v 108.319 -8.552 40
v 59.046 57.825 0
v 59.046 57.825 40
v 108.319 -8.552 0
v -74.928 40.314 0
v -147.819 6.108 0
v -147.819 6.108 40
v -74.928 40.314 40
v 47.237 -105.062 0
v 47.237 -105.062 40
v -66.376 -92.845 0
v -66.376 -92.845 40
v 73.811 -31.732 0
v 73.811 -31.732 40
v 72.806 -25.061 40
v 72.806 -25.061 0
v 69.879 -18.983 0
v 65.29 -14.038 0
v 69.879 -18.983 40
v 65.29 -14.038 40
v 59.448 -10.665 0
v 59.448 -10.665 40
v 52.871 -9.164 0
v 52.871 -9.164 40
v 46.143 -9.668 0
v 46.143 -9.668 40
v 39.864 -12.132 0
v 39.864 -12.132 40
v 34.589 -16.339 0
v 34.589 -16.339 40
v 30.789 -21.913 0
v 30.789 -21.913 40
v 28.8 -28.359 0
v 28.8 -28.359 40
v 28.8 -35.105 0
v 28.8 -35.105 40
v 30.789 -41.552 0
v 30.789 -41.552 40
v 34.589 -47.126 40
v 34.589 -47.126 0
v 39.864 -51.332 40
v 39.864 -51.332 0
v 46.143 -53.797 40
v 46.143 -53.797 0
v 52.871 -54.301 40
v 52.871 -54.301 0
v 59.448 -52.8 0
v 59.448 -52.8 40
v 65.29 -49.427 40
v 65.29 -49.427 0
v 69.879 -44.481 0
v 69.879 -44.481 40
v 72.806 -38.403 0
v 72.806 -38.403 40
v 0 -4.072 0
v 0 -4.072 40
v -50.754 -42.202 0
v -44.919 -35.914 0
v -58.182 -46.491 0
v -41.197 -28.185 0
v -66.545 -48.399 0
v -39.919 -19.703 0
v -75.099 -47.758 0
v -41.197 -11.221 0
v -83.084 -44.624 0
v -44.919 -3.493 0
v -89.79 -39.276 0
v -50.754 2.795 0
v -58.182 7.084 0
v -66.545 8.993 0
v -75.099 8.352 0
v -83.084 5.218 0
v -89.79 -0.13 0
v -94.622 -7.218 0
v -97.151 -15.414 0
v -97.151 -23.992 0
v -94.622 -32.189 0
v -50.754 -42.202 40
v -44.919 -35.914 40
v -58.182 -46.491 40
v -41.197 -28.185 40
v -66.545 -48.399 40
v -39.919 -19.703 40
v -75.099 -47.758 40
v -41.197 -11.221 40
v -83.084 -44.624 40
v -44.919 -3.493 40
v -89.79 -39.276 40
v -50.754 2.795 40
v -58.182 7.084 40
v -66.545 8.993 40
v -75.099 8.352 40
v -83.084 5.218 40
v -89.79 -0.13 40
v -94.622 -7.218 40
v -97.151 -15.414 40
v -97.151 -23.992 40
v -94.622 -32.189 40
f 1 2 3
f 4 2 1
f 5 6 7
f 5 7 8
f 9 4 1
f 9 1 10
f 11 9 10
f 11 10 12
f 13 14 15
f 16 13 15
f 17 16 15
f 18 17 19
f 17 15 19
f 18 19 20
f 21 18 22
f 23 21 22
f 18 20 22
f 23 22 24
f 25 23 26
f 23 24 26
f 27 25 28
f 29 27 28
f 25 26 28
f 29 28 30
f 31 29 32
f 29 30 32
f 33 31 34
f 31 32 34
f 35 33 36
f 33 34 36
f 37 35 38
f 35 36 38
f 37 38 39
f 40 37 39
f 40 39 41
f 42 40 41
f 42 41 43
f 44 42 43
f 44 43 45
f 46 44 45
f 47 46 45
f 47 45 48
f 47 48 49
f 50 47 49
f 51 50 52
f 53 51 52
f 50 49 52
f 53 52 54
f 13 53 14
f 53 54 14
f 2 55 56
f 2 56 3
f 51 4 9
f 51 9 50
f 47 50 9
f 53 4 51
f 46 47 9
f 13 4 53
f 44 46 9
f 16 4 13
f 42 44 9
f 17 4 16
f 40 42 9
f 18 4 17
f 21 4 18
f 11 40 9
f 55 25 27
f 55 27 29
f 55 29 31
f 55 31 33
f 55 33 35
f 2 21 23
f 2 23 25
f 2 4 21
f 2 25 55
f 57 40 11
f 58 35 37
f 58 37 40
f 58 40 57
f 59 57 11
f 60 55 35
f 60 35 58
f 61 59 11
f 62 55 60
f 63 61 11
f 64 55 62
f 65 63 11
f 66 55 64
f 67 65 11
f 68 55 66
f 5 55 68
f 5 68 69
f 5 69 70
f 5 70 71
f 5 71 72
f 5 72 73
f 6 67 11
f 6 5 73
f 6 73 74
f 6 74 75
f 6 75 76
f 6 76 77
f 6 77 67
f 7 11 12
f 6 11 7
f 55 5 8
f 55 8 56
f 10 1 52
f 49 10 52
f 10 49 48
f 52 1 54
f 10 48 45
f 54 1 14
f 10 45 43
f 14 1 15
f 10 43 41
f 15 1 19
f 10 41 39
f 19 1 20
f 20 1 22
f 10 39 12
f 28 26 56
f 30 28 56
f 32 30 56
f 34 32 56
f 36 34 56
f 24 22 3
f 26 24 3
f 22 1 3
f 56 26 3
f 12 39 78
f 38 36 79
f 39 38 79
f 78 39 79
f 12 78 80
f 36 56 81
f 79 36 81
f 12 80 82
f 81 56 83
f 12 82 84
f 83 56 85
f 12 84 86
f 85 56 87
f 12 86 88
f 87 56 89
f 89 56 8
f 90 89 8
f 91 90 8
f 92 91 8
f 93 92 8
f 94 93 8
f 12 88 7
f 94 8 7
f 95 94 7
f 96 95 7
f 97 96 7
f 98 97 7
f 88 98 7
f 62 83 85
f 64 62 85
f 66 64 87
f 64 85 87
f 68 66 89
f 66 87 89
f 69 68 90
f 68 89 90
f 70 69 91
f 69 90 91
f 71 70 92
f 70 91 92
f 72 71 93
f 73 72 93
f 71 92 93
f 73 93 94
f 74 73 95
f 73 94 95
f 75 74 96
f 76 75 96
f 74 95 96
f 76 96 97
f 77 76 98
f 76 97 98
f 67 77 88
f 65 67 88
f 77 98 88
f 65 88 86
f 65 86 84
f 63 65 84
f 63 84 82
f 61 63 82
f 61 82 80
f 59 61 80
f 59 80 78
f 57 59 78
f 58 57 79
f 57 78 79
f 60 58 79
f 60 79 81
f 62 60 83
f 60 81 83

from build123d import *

# Parameters (mm, degrees)
BOSS_EXTRUDE1_DEPTH = 40
SKETCH2_R           = 22.631847918
SKETCH2_R_2         = 28.776537022
CUT_EXTRUDE2_DEPTH  = 40


with BuildPart() as part:
    # Sketch1 → Boss-Extrude1 (new body)
    with BuildSketch(Plane.XY):
        Polygon((-147.819271396, 6.108234355), (-74.927674757, 40.314346744), (0, -4.072156237), (59.046265434, 57.824618563), (108.319355899, -8.551528097), (47.237012347, -105.061630909), (-66.37614666, -92.845162199), align=None)
    extrude(amount=BOSS_EXTRUDE1_DEPTH)

    # Sketch2 → Cut-Extrude2 (cut)
    with BuildSketch(Plane.XY.offset(40)):
        with Locations((51.179511342, -31.732249283)):
            Circle(SKETCH2_R)
        with Locations((-68.695439343, -19.703274992)):
            Circle(SKETCH2_R_2)
    extrude(amount=-CUT_EXTRUDE2_DEPTH, mode=Mode.SUBTRACT)


solid = part.part
